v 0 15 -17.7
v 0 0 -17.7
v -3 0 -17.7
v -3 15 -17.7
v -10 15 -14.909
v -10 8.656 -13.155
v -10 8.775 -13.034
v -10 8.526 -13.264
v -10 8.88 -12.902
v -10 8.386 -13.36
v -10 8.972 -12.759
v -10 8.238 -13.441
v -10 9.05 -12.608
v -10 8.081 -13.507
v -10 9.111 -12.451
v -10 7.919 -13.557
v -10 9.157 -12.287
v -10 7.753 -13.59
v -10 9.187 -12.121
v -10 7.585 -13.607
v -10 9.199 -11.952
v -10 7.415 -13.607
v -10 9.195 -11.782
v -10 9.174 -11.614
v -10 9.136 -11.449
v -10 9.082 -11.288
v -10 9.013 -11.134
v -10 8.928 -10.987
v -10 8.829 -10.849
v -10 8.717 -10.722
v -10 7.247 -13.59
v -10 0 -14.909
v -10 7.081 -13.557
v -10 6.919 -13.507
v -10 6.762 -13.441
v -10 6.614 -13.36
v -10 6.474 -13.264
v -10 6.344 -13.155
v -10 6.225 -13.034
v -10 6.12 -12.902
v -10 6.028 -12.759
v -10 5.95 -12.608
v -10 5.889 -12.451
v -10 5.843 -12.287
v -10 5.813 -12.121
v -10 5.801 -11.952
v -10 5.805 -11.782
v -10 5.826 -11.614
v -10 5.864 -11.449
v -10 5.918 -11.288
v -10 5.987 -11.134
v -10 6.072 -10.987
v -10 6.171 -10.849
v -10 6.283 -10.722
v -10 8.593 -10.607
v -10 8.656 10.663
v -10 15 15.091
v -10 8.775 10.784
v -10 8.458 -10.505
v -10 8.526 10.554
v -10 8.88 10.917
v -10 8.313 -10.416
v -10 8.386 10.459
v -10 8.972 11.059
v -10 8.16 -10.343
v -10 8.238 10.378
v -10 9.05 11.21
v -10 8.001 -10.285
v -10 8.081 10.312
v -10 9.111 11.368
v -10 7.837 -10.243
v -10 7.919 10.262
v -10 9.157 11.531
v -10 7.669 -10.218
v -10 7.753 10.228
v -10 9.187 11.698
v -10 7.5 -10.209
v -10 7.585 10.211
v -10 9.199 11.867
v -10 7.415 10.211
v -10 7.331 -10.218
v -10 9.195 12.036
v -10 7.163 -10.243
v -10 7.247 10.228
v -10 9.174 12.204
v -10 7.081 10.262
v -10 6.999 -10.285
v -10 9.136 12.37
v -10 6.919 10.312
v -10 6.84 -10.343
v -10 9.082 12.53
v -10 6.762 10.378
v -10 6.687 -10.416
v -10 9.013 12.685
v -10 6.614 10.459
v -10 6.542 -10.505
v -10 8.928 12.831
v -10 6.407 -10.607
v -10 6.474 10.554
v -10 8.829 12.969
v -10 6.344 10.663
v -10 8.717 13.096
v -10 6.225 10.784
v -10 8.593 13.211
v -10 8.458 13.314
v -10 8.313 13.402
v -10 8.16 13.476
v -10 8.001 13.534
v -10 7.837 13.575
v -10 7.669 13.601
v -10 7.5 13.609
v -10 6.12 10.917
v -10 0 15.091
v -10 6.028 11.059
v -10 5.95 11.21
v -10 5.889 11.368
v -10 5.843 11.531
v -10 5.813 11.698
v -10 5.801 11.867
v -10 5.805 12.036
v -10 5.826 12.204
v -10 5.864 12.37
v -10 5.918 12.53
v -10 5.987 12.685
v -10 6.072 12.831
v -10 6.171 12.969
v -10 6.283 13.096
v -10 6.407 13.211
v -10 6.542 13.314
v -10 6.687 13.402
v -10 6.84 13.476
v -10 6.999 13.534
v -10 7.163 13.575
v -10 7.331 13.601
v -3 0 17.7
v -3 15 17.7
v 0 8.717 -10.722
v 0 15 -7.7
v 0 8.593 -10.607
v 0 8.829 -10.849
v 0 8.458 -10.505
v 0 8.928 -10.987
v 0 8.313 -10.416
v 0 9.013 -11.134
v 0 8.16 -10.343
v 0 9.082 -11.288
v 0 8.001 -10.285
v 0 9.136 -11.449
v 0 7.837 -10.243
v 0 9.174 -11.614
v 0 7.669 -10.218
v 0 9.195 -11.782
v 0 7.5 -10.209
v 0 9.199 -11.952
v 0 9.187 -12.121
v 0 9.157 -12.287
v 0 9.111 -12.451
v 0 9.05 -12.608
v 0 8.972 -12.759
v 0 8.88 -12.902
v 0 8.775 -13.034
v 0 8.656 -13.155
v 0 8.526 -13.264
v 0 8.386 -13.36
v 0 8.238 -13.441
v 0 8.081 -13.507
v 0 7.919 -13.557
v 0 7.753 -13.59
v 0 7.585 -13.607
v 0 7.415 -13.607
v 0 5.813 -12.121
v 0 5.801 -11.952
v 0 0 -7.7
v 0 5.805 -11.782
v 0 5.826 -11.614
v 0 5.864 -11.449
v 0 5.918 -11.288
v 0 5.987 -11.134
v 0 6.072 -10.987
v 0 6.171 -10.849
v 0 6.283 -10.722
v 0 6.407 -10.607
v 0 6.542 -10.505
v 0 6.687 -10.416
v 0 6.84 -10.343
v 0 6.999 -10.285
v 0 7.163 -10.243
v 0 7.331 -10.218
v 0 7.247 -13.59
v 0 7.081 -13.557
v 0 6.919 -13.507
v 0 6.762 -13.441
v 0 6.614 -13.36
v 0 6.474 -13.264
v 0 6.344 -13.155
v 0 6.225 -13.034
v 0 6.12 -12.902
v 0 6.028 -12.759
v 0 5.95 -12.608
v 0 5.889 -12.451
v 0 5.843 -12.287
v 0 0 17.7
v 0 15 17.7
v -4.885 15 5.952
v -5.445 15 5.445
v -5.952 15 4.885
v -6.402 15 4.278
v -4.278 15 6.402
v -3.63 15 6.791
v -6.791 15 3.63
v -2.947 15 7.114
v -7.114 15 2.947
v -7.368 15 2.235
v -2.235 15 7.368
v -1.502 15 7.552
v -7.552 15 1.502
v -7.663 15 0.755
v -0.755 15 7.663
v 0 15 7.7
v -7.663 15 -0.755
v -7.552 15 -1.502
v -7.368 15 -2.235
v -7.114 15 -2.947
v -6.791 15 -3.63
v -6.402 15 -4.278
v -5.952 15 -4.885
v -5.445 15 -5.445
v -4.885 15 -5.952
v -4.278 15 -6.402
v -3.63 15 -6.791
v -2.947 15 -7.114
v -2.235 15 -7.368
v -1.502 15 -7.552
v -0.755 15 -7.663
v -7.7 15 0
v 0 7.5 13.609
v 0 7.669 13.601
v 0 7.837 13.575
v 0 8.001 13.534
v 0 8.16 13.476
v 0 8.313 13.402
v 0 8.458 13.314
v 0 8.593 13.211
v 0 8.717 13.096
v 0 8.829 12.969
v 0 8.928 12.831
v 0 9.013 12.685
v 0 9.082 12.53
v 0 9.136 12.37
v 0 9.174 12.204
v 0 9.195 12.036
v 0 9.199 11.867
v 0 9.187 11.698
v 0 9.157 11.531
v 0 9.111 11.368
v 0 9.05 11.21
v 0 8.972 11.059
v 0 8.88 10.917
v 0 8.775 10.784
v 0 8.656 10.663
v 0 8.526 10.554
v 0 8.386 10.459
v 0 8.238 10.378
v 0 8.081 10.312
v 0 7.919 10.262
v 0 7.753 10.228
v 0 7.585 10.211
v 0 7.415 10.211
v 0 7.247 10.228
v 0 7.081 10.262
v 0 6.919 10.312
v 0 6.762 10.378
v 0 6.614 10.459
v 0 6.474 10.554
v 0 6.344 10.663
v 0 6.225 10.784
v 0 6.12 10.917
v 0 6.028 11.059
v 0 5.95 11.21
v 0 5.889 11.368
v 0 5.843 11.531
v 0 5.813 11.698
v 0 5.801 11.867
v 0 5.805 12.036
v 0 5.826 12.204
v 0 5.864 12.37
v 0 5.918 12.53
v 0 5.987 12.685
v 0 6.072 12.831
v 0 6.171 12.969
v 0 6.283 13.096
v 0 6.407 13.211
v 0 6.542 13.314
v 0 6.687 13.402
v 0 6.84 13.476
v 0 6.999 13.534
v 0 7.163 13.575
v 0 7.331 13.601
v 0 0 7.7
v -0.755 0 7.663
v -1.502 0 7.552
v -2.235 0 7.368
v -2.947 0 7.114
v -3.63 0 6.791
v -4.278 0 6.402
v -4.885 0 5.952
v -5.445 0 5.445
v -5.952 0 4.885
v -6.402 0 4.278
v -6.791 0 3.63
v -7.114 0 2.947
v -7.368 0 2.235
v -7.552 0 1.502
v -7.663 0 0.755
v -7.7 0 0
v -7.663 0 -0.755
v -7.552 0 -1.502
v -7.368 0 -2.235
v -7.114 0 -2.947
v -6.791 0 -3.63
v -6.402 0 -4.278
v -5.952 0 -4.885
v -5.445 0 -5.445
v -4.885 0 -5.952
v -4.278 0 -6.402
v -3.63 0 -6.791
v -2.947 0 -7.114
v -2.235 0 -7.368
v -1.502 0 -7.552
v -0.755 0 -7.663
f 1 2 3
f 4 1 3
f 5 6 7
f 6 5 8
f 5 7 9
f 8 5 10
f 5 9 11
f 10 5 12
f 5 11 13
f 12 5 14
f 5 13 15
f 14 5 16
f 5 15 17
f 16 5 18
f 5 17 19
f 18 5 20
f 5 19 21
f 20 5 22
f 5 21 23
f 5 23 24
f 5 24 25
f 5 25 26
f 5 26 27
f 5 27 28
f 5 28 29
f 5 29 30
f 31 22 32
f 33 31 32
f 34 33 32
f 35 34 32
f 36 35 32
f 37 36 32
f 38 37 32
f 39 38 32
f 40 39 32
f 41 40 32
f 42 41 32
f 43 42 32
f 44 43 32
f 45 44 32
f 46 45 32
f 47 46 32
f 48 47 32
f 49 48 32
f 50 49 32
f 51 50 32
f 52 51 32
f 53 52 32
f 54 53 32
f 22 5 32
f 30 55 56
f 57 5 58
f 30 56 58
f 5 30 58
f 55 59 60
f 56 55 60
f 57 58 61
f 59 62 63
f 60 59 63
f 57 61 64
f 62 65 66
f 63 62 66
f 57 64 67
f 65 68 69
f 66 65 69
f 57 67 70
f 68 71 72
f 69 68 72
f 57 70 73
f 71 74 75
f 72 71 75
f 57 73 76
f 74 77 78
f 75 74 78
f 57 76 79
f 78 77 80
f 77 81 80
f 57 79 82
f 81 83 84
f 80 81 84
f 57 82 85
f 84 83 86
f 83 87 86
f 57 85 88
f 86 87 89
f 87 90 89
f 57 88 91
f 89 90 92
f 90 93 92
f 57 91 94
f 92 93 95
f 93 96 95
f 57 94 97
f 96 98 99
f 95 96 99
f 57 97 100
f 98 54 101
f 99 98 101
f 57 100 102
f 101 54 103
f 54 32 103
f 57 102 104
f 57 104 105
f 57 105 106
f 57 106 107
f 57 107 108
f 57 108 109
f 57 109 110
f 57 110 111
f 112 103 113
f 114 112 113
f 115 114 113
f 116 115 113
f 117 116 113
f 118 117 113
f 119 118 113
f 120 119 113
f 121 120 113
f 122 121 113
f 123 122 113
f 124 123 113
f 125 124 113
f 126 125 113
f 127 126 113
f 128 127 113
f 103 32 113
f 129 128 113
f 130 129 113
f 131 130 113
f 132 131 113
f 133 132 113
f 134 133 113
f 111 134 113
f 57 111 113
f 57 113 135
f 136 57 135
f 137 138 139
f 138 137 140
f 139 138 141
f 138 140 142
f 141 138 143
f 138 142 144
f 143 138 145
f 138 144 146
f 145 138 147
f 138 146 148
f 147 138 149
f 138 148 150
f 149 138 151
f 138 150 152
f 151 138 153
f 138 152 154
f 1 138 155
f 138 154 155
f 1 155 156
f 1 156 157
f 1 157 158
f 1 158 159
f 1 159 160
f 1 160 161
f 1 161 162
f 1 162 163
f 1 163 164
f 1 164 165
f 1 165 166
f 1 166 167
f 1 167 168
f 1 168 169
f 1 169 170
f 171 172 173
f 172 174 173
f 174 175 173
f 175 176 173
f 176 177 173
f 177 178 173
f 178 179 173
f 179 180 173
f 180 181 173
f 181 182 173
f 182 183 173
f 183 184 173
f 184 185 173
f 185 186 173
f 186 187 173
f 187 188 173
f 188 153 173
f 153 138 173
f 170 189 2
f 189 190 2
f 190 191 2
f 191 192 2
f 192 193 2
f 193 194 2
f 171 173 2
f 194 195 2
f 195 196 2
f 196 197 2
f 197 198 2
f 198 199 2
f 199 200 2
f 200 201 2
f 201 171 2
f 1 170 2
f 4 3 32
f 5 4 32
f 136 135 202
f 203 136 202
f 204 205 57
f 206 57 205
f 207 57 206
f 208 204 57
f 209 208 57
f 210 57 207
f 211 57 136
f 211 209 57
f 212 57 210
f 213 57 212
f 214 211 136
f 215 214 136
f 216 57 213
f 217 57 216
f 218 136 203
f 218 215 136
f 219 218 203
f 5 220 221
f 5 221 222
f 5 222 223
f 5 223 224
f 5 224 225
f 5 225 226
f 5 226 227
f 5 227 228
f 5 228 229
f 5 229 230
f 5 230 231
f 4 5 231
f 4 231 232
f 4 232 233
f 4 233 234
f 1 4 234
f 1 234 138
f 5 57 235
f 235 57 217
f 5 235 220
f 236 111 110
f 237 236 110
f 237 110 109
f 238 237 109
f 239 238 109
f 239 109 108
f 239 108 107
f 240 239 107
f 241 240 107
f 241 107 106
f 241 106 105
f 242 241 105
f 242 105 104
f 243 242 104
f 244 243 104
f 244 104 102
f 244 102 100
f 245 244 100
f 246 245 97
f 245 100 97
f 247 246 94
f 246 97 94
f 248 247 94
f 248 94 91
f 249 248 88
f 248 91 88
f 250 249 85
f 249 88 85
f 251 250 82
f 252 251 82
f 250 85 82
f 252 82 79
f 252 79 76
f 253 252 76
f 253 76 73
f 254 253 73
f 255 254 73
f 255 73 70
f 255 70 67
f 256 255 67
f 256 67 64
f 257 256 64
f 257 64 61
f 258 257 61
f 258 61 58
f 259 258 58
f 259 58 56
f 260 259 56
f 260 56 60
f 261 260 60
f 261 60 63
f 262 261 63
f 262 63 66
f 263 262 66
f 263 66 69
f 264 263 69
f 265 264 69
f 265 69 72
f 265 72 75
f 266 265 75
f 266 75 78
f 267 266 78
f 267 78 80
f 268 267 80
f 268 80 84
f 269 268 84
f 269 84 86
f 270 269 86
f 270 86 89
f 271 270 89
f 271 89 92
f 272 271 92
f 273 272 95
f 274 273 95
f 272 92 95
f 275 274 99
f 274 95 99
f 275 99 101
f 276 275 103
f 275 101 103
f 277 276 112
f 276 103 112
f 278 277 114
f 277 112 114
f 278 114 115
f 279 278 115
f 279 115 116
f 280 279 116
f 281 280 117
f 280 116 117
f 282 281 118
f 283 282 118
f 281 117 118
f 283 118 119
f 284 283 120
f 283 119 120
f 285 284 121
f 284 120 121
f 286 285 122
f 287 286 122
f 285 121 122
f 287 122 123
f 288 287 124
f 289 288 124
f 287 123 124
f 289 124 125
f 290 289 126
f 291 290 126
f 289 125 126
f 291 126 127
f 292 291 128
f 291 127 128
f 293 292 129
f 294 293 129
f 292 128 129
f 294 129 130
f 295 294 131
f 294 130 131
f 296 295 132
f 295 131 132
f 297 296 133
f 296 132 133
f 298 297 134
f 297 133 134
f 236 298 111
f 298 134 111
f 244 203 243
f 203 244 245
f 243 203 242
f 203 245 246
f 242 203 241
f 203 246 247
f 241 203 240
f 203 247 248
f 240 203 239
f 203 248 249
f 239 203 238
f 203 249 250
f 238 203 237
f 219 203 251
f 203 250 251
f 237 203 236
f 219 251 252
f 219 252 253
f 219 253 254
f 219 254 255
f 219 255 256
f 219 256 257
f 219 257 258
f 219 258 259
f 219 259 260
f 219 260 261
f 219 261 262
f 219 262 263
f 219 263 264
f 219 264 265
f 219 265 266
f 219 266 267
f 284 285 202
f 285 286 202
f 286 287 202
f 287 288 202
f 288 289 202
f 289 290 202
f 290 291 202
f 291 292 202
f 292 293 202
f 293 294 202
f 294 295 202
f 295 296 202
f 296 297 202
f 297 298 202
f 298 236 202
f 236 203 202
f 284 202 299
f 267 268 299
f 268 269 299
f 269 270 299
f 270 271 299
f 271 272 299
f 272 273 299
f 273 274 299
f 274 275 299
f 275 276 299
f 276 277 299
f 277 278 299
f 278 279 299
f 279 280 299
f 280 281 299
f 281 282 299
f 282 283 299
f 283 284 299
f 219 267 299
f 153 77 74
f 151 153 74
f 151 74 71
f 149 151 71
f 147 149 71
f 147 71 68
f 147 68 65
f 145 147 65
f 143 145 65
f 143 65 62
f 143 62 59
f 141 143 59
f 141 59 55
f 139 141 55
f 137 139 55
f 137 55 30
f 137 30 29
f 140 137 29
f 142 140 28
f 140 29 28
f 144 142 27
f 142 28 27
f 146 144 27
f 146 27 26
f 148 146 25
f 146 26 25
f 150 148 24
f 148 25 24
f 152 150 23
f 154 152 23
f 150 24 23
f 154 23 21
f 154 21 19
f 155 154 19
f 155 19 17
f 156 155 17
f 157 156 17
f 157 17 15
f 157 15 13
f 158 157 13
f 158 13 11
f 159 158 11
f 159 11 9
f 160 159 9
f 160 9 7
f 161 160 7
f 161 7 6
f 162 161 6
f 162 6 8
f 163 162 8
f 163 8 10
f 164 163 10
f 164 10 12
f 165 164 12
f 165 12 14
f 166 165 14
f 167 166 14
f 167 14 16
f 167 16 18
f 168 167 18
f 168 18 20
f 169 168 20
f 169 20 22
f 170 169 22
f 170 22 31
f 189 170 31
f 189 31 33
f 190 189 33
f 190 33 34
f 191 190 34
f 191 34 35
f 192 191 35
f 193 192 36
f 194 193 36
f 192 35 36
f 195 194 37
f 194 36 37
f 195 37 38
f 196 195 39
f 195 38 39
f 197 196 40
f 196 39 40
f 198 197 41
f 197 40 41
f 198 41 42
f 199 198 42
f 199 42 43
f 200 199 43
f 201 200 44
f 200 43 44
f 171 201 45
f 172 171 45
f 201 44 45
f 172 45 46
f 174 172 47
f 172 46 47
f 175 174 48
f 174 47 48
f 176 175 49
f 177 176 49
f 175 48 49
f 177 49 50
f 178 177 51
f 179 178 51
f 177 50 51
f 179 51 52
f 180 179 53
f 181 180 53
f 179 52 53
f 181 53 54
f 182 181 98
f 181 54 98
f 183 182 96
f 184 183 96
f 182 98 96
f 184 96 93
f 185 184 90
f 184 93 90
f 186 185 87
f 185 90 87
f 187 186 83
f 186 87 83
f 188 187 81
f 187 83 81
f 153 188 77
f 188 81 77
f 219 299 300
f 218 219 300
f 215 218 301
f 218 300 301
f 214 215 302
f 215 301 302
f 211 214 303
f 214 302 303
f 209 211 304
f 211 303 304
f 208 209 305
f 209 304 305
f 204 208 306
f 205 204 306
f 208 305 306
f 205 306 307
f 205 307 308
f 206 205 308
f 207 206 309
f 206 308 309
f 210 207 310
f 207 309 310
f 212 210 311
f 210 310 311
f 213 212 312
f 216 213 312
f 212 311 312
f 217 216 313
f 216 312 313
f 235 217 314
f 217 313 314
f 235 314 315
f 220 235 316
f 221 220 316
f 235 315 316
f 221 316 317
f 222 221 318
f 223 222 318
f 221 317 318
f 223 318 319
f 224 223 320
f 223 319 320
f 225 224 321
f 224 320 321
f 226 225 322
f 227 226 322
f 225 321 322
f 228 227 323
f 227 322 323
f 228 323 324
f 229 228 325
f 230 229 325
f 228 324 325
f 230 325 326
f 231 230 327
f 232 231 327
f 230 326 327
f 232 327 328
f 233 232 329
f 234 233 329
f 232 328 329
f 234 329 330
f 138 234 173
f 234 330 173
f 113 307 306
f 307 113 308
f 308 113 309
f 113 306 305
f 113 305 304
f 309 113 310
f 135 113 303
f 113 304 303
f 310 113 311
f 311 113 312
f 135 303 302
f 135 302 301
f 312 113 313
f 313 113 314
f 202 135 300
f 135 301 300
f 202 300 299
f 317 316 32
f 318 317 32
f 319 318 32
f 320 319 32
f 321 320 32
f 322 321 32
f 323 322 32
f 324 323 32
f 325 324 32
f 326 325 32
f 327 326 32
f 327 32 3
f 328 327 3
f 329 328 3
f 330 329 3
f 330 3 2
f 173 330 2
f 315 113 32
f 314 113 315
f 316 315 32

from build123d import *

# Parameters (mm, degrees)
BOSS_EXTRUDE1_DEPTH = 15
SKETCH2_R           = 1.7
CUT_EXTRUDE1_DEPTH  = 15


with BuildPart() as part:
    # Sketch1 → Boss-Extrude1 (new body)
    with BuildSketch(Plane(origin=(0, 0, 0), x_dir=(1, 0, 0), z_dir=(0, 1, 0))):
        with BuildLine():
            Line((0, 7.7), (0, 17.7))
            Line((0, 17.7), (-3, 17.7))
            Line((-3, 17.7), (-10, 14.909160565))
            Line((-10, 14.909160565), (-10, -15.090839435))
            Line((-10, -15.090839435), (-3, -17.7))
            Line((-3, -17.7), (0, -17.7))
            Line((0, -17.7), (0, -7.7))
            ThreePointArc((0, -7.7), (-7.7, 0), (0, 7.7))
        make_face()
    extrude(amount=BOSS_EXTRUDE1_DEPTH)

    # Sketch2 → Cut-Extrude1 (cut)
    with BuildSketch(Plane.ZY.offset(10)):
        with Locations((-11.909160565, 7.5)):
            Circle(SKETCH2_R)
        with Locations((11.909160565, 7.5)):
            Circle(SKETCH2_R)
    extrude(amount=-CUT_EXTRUDE1_DEPTH, mode=Mode.SUBTRACT)


solid = part.part
